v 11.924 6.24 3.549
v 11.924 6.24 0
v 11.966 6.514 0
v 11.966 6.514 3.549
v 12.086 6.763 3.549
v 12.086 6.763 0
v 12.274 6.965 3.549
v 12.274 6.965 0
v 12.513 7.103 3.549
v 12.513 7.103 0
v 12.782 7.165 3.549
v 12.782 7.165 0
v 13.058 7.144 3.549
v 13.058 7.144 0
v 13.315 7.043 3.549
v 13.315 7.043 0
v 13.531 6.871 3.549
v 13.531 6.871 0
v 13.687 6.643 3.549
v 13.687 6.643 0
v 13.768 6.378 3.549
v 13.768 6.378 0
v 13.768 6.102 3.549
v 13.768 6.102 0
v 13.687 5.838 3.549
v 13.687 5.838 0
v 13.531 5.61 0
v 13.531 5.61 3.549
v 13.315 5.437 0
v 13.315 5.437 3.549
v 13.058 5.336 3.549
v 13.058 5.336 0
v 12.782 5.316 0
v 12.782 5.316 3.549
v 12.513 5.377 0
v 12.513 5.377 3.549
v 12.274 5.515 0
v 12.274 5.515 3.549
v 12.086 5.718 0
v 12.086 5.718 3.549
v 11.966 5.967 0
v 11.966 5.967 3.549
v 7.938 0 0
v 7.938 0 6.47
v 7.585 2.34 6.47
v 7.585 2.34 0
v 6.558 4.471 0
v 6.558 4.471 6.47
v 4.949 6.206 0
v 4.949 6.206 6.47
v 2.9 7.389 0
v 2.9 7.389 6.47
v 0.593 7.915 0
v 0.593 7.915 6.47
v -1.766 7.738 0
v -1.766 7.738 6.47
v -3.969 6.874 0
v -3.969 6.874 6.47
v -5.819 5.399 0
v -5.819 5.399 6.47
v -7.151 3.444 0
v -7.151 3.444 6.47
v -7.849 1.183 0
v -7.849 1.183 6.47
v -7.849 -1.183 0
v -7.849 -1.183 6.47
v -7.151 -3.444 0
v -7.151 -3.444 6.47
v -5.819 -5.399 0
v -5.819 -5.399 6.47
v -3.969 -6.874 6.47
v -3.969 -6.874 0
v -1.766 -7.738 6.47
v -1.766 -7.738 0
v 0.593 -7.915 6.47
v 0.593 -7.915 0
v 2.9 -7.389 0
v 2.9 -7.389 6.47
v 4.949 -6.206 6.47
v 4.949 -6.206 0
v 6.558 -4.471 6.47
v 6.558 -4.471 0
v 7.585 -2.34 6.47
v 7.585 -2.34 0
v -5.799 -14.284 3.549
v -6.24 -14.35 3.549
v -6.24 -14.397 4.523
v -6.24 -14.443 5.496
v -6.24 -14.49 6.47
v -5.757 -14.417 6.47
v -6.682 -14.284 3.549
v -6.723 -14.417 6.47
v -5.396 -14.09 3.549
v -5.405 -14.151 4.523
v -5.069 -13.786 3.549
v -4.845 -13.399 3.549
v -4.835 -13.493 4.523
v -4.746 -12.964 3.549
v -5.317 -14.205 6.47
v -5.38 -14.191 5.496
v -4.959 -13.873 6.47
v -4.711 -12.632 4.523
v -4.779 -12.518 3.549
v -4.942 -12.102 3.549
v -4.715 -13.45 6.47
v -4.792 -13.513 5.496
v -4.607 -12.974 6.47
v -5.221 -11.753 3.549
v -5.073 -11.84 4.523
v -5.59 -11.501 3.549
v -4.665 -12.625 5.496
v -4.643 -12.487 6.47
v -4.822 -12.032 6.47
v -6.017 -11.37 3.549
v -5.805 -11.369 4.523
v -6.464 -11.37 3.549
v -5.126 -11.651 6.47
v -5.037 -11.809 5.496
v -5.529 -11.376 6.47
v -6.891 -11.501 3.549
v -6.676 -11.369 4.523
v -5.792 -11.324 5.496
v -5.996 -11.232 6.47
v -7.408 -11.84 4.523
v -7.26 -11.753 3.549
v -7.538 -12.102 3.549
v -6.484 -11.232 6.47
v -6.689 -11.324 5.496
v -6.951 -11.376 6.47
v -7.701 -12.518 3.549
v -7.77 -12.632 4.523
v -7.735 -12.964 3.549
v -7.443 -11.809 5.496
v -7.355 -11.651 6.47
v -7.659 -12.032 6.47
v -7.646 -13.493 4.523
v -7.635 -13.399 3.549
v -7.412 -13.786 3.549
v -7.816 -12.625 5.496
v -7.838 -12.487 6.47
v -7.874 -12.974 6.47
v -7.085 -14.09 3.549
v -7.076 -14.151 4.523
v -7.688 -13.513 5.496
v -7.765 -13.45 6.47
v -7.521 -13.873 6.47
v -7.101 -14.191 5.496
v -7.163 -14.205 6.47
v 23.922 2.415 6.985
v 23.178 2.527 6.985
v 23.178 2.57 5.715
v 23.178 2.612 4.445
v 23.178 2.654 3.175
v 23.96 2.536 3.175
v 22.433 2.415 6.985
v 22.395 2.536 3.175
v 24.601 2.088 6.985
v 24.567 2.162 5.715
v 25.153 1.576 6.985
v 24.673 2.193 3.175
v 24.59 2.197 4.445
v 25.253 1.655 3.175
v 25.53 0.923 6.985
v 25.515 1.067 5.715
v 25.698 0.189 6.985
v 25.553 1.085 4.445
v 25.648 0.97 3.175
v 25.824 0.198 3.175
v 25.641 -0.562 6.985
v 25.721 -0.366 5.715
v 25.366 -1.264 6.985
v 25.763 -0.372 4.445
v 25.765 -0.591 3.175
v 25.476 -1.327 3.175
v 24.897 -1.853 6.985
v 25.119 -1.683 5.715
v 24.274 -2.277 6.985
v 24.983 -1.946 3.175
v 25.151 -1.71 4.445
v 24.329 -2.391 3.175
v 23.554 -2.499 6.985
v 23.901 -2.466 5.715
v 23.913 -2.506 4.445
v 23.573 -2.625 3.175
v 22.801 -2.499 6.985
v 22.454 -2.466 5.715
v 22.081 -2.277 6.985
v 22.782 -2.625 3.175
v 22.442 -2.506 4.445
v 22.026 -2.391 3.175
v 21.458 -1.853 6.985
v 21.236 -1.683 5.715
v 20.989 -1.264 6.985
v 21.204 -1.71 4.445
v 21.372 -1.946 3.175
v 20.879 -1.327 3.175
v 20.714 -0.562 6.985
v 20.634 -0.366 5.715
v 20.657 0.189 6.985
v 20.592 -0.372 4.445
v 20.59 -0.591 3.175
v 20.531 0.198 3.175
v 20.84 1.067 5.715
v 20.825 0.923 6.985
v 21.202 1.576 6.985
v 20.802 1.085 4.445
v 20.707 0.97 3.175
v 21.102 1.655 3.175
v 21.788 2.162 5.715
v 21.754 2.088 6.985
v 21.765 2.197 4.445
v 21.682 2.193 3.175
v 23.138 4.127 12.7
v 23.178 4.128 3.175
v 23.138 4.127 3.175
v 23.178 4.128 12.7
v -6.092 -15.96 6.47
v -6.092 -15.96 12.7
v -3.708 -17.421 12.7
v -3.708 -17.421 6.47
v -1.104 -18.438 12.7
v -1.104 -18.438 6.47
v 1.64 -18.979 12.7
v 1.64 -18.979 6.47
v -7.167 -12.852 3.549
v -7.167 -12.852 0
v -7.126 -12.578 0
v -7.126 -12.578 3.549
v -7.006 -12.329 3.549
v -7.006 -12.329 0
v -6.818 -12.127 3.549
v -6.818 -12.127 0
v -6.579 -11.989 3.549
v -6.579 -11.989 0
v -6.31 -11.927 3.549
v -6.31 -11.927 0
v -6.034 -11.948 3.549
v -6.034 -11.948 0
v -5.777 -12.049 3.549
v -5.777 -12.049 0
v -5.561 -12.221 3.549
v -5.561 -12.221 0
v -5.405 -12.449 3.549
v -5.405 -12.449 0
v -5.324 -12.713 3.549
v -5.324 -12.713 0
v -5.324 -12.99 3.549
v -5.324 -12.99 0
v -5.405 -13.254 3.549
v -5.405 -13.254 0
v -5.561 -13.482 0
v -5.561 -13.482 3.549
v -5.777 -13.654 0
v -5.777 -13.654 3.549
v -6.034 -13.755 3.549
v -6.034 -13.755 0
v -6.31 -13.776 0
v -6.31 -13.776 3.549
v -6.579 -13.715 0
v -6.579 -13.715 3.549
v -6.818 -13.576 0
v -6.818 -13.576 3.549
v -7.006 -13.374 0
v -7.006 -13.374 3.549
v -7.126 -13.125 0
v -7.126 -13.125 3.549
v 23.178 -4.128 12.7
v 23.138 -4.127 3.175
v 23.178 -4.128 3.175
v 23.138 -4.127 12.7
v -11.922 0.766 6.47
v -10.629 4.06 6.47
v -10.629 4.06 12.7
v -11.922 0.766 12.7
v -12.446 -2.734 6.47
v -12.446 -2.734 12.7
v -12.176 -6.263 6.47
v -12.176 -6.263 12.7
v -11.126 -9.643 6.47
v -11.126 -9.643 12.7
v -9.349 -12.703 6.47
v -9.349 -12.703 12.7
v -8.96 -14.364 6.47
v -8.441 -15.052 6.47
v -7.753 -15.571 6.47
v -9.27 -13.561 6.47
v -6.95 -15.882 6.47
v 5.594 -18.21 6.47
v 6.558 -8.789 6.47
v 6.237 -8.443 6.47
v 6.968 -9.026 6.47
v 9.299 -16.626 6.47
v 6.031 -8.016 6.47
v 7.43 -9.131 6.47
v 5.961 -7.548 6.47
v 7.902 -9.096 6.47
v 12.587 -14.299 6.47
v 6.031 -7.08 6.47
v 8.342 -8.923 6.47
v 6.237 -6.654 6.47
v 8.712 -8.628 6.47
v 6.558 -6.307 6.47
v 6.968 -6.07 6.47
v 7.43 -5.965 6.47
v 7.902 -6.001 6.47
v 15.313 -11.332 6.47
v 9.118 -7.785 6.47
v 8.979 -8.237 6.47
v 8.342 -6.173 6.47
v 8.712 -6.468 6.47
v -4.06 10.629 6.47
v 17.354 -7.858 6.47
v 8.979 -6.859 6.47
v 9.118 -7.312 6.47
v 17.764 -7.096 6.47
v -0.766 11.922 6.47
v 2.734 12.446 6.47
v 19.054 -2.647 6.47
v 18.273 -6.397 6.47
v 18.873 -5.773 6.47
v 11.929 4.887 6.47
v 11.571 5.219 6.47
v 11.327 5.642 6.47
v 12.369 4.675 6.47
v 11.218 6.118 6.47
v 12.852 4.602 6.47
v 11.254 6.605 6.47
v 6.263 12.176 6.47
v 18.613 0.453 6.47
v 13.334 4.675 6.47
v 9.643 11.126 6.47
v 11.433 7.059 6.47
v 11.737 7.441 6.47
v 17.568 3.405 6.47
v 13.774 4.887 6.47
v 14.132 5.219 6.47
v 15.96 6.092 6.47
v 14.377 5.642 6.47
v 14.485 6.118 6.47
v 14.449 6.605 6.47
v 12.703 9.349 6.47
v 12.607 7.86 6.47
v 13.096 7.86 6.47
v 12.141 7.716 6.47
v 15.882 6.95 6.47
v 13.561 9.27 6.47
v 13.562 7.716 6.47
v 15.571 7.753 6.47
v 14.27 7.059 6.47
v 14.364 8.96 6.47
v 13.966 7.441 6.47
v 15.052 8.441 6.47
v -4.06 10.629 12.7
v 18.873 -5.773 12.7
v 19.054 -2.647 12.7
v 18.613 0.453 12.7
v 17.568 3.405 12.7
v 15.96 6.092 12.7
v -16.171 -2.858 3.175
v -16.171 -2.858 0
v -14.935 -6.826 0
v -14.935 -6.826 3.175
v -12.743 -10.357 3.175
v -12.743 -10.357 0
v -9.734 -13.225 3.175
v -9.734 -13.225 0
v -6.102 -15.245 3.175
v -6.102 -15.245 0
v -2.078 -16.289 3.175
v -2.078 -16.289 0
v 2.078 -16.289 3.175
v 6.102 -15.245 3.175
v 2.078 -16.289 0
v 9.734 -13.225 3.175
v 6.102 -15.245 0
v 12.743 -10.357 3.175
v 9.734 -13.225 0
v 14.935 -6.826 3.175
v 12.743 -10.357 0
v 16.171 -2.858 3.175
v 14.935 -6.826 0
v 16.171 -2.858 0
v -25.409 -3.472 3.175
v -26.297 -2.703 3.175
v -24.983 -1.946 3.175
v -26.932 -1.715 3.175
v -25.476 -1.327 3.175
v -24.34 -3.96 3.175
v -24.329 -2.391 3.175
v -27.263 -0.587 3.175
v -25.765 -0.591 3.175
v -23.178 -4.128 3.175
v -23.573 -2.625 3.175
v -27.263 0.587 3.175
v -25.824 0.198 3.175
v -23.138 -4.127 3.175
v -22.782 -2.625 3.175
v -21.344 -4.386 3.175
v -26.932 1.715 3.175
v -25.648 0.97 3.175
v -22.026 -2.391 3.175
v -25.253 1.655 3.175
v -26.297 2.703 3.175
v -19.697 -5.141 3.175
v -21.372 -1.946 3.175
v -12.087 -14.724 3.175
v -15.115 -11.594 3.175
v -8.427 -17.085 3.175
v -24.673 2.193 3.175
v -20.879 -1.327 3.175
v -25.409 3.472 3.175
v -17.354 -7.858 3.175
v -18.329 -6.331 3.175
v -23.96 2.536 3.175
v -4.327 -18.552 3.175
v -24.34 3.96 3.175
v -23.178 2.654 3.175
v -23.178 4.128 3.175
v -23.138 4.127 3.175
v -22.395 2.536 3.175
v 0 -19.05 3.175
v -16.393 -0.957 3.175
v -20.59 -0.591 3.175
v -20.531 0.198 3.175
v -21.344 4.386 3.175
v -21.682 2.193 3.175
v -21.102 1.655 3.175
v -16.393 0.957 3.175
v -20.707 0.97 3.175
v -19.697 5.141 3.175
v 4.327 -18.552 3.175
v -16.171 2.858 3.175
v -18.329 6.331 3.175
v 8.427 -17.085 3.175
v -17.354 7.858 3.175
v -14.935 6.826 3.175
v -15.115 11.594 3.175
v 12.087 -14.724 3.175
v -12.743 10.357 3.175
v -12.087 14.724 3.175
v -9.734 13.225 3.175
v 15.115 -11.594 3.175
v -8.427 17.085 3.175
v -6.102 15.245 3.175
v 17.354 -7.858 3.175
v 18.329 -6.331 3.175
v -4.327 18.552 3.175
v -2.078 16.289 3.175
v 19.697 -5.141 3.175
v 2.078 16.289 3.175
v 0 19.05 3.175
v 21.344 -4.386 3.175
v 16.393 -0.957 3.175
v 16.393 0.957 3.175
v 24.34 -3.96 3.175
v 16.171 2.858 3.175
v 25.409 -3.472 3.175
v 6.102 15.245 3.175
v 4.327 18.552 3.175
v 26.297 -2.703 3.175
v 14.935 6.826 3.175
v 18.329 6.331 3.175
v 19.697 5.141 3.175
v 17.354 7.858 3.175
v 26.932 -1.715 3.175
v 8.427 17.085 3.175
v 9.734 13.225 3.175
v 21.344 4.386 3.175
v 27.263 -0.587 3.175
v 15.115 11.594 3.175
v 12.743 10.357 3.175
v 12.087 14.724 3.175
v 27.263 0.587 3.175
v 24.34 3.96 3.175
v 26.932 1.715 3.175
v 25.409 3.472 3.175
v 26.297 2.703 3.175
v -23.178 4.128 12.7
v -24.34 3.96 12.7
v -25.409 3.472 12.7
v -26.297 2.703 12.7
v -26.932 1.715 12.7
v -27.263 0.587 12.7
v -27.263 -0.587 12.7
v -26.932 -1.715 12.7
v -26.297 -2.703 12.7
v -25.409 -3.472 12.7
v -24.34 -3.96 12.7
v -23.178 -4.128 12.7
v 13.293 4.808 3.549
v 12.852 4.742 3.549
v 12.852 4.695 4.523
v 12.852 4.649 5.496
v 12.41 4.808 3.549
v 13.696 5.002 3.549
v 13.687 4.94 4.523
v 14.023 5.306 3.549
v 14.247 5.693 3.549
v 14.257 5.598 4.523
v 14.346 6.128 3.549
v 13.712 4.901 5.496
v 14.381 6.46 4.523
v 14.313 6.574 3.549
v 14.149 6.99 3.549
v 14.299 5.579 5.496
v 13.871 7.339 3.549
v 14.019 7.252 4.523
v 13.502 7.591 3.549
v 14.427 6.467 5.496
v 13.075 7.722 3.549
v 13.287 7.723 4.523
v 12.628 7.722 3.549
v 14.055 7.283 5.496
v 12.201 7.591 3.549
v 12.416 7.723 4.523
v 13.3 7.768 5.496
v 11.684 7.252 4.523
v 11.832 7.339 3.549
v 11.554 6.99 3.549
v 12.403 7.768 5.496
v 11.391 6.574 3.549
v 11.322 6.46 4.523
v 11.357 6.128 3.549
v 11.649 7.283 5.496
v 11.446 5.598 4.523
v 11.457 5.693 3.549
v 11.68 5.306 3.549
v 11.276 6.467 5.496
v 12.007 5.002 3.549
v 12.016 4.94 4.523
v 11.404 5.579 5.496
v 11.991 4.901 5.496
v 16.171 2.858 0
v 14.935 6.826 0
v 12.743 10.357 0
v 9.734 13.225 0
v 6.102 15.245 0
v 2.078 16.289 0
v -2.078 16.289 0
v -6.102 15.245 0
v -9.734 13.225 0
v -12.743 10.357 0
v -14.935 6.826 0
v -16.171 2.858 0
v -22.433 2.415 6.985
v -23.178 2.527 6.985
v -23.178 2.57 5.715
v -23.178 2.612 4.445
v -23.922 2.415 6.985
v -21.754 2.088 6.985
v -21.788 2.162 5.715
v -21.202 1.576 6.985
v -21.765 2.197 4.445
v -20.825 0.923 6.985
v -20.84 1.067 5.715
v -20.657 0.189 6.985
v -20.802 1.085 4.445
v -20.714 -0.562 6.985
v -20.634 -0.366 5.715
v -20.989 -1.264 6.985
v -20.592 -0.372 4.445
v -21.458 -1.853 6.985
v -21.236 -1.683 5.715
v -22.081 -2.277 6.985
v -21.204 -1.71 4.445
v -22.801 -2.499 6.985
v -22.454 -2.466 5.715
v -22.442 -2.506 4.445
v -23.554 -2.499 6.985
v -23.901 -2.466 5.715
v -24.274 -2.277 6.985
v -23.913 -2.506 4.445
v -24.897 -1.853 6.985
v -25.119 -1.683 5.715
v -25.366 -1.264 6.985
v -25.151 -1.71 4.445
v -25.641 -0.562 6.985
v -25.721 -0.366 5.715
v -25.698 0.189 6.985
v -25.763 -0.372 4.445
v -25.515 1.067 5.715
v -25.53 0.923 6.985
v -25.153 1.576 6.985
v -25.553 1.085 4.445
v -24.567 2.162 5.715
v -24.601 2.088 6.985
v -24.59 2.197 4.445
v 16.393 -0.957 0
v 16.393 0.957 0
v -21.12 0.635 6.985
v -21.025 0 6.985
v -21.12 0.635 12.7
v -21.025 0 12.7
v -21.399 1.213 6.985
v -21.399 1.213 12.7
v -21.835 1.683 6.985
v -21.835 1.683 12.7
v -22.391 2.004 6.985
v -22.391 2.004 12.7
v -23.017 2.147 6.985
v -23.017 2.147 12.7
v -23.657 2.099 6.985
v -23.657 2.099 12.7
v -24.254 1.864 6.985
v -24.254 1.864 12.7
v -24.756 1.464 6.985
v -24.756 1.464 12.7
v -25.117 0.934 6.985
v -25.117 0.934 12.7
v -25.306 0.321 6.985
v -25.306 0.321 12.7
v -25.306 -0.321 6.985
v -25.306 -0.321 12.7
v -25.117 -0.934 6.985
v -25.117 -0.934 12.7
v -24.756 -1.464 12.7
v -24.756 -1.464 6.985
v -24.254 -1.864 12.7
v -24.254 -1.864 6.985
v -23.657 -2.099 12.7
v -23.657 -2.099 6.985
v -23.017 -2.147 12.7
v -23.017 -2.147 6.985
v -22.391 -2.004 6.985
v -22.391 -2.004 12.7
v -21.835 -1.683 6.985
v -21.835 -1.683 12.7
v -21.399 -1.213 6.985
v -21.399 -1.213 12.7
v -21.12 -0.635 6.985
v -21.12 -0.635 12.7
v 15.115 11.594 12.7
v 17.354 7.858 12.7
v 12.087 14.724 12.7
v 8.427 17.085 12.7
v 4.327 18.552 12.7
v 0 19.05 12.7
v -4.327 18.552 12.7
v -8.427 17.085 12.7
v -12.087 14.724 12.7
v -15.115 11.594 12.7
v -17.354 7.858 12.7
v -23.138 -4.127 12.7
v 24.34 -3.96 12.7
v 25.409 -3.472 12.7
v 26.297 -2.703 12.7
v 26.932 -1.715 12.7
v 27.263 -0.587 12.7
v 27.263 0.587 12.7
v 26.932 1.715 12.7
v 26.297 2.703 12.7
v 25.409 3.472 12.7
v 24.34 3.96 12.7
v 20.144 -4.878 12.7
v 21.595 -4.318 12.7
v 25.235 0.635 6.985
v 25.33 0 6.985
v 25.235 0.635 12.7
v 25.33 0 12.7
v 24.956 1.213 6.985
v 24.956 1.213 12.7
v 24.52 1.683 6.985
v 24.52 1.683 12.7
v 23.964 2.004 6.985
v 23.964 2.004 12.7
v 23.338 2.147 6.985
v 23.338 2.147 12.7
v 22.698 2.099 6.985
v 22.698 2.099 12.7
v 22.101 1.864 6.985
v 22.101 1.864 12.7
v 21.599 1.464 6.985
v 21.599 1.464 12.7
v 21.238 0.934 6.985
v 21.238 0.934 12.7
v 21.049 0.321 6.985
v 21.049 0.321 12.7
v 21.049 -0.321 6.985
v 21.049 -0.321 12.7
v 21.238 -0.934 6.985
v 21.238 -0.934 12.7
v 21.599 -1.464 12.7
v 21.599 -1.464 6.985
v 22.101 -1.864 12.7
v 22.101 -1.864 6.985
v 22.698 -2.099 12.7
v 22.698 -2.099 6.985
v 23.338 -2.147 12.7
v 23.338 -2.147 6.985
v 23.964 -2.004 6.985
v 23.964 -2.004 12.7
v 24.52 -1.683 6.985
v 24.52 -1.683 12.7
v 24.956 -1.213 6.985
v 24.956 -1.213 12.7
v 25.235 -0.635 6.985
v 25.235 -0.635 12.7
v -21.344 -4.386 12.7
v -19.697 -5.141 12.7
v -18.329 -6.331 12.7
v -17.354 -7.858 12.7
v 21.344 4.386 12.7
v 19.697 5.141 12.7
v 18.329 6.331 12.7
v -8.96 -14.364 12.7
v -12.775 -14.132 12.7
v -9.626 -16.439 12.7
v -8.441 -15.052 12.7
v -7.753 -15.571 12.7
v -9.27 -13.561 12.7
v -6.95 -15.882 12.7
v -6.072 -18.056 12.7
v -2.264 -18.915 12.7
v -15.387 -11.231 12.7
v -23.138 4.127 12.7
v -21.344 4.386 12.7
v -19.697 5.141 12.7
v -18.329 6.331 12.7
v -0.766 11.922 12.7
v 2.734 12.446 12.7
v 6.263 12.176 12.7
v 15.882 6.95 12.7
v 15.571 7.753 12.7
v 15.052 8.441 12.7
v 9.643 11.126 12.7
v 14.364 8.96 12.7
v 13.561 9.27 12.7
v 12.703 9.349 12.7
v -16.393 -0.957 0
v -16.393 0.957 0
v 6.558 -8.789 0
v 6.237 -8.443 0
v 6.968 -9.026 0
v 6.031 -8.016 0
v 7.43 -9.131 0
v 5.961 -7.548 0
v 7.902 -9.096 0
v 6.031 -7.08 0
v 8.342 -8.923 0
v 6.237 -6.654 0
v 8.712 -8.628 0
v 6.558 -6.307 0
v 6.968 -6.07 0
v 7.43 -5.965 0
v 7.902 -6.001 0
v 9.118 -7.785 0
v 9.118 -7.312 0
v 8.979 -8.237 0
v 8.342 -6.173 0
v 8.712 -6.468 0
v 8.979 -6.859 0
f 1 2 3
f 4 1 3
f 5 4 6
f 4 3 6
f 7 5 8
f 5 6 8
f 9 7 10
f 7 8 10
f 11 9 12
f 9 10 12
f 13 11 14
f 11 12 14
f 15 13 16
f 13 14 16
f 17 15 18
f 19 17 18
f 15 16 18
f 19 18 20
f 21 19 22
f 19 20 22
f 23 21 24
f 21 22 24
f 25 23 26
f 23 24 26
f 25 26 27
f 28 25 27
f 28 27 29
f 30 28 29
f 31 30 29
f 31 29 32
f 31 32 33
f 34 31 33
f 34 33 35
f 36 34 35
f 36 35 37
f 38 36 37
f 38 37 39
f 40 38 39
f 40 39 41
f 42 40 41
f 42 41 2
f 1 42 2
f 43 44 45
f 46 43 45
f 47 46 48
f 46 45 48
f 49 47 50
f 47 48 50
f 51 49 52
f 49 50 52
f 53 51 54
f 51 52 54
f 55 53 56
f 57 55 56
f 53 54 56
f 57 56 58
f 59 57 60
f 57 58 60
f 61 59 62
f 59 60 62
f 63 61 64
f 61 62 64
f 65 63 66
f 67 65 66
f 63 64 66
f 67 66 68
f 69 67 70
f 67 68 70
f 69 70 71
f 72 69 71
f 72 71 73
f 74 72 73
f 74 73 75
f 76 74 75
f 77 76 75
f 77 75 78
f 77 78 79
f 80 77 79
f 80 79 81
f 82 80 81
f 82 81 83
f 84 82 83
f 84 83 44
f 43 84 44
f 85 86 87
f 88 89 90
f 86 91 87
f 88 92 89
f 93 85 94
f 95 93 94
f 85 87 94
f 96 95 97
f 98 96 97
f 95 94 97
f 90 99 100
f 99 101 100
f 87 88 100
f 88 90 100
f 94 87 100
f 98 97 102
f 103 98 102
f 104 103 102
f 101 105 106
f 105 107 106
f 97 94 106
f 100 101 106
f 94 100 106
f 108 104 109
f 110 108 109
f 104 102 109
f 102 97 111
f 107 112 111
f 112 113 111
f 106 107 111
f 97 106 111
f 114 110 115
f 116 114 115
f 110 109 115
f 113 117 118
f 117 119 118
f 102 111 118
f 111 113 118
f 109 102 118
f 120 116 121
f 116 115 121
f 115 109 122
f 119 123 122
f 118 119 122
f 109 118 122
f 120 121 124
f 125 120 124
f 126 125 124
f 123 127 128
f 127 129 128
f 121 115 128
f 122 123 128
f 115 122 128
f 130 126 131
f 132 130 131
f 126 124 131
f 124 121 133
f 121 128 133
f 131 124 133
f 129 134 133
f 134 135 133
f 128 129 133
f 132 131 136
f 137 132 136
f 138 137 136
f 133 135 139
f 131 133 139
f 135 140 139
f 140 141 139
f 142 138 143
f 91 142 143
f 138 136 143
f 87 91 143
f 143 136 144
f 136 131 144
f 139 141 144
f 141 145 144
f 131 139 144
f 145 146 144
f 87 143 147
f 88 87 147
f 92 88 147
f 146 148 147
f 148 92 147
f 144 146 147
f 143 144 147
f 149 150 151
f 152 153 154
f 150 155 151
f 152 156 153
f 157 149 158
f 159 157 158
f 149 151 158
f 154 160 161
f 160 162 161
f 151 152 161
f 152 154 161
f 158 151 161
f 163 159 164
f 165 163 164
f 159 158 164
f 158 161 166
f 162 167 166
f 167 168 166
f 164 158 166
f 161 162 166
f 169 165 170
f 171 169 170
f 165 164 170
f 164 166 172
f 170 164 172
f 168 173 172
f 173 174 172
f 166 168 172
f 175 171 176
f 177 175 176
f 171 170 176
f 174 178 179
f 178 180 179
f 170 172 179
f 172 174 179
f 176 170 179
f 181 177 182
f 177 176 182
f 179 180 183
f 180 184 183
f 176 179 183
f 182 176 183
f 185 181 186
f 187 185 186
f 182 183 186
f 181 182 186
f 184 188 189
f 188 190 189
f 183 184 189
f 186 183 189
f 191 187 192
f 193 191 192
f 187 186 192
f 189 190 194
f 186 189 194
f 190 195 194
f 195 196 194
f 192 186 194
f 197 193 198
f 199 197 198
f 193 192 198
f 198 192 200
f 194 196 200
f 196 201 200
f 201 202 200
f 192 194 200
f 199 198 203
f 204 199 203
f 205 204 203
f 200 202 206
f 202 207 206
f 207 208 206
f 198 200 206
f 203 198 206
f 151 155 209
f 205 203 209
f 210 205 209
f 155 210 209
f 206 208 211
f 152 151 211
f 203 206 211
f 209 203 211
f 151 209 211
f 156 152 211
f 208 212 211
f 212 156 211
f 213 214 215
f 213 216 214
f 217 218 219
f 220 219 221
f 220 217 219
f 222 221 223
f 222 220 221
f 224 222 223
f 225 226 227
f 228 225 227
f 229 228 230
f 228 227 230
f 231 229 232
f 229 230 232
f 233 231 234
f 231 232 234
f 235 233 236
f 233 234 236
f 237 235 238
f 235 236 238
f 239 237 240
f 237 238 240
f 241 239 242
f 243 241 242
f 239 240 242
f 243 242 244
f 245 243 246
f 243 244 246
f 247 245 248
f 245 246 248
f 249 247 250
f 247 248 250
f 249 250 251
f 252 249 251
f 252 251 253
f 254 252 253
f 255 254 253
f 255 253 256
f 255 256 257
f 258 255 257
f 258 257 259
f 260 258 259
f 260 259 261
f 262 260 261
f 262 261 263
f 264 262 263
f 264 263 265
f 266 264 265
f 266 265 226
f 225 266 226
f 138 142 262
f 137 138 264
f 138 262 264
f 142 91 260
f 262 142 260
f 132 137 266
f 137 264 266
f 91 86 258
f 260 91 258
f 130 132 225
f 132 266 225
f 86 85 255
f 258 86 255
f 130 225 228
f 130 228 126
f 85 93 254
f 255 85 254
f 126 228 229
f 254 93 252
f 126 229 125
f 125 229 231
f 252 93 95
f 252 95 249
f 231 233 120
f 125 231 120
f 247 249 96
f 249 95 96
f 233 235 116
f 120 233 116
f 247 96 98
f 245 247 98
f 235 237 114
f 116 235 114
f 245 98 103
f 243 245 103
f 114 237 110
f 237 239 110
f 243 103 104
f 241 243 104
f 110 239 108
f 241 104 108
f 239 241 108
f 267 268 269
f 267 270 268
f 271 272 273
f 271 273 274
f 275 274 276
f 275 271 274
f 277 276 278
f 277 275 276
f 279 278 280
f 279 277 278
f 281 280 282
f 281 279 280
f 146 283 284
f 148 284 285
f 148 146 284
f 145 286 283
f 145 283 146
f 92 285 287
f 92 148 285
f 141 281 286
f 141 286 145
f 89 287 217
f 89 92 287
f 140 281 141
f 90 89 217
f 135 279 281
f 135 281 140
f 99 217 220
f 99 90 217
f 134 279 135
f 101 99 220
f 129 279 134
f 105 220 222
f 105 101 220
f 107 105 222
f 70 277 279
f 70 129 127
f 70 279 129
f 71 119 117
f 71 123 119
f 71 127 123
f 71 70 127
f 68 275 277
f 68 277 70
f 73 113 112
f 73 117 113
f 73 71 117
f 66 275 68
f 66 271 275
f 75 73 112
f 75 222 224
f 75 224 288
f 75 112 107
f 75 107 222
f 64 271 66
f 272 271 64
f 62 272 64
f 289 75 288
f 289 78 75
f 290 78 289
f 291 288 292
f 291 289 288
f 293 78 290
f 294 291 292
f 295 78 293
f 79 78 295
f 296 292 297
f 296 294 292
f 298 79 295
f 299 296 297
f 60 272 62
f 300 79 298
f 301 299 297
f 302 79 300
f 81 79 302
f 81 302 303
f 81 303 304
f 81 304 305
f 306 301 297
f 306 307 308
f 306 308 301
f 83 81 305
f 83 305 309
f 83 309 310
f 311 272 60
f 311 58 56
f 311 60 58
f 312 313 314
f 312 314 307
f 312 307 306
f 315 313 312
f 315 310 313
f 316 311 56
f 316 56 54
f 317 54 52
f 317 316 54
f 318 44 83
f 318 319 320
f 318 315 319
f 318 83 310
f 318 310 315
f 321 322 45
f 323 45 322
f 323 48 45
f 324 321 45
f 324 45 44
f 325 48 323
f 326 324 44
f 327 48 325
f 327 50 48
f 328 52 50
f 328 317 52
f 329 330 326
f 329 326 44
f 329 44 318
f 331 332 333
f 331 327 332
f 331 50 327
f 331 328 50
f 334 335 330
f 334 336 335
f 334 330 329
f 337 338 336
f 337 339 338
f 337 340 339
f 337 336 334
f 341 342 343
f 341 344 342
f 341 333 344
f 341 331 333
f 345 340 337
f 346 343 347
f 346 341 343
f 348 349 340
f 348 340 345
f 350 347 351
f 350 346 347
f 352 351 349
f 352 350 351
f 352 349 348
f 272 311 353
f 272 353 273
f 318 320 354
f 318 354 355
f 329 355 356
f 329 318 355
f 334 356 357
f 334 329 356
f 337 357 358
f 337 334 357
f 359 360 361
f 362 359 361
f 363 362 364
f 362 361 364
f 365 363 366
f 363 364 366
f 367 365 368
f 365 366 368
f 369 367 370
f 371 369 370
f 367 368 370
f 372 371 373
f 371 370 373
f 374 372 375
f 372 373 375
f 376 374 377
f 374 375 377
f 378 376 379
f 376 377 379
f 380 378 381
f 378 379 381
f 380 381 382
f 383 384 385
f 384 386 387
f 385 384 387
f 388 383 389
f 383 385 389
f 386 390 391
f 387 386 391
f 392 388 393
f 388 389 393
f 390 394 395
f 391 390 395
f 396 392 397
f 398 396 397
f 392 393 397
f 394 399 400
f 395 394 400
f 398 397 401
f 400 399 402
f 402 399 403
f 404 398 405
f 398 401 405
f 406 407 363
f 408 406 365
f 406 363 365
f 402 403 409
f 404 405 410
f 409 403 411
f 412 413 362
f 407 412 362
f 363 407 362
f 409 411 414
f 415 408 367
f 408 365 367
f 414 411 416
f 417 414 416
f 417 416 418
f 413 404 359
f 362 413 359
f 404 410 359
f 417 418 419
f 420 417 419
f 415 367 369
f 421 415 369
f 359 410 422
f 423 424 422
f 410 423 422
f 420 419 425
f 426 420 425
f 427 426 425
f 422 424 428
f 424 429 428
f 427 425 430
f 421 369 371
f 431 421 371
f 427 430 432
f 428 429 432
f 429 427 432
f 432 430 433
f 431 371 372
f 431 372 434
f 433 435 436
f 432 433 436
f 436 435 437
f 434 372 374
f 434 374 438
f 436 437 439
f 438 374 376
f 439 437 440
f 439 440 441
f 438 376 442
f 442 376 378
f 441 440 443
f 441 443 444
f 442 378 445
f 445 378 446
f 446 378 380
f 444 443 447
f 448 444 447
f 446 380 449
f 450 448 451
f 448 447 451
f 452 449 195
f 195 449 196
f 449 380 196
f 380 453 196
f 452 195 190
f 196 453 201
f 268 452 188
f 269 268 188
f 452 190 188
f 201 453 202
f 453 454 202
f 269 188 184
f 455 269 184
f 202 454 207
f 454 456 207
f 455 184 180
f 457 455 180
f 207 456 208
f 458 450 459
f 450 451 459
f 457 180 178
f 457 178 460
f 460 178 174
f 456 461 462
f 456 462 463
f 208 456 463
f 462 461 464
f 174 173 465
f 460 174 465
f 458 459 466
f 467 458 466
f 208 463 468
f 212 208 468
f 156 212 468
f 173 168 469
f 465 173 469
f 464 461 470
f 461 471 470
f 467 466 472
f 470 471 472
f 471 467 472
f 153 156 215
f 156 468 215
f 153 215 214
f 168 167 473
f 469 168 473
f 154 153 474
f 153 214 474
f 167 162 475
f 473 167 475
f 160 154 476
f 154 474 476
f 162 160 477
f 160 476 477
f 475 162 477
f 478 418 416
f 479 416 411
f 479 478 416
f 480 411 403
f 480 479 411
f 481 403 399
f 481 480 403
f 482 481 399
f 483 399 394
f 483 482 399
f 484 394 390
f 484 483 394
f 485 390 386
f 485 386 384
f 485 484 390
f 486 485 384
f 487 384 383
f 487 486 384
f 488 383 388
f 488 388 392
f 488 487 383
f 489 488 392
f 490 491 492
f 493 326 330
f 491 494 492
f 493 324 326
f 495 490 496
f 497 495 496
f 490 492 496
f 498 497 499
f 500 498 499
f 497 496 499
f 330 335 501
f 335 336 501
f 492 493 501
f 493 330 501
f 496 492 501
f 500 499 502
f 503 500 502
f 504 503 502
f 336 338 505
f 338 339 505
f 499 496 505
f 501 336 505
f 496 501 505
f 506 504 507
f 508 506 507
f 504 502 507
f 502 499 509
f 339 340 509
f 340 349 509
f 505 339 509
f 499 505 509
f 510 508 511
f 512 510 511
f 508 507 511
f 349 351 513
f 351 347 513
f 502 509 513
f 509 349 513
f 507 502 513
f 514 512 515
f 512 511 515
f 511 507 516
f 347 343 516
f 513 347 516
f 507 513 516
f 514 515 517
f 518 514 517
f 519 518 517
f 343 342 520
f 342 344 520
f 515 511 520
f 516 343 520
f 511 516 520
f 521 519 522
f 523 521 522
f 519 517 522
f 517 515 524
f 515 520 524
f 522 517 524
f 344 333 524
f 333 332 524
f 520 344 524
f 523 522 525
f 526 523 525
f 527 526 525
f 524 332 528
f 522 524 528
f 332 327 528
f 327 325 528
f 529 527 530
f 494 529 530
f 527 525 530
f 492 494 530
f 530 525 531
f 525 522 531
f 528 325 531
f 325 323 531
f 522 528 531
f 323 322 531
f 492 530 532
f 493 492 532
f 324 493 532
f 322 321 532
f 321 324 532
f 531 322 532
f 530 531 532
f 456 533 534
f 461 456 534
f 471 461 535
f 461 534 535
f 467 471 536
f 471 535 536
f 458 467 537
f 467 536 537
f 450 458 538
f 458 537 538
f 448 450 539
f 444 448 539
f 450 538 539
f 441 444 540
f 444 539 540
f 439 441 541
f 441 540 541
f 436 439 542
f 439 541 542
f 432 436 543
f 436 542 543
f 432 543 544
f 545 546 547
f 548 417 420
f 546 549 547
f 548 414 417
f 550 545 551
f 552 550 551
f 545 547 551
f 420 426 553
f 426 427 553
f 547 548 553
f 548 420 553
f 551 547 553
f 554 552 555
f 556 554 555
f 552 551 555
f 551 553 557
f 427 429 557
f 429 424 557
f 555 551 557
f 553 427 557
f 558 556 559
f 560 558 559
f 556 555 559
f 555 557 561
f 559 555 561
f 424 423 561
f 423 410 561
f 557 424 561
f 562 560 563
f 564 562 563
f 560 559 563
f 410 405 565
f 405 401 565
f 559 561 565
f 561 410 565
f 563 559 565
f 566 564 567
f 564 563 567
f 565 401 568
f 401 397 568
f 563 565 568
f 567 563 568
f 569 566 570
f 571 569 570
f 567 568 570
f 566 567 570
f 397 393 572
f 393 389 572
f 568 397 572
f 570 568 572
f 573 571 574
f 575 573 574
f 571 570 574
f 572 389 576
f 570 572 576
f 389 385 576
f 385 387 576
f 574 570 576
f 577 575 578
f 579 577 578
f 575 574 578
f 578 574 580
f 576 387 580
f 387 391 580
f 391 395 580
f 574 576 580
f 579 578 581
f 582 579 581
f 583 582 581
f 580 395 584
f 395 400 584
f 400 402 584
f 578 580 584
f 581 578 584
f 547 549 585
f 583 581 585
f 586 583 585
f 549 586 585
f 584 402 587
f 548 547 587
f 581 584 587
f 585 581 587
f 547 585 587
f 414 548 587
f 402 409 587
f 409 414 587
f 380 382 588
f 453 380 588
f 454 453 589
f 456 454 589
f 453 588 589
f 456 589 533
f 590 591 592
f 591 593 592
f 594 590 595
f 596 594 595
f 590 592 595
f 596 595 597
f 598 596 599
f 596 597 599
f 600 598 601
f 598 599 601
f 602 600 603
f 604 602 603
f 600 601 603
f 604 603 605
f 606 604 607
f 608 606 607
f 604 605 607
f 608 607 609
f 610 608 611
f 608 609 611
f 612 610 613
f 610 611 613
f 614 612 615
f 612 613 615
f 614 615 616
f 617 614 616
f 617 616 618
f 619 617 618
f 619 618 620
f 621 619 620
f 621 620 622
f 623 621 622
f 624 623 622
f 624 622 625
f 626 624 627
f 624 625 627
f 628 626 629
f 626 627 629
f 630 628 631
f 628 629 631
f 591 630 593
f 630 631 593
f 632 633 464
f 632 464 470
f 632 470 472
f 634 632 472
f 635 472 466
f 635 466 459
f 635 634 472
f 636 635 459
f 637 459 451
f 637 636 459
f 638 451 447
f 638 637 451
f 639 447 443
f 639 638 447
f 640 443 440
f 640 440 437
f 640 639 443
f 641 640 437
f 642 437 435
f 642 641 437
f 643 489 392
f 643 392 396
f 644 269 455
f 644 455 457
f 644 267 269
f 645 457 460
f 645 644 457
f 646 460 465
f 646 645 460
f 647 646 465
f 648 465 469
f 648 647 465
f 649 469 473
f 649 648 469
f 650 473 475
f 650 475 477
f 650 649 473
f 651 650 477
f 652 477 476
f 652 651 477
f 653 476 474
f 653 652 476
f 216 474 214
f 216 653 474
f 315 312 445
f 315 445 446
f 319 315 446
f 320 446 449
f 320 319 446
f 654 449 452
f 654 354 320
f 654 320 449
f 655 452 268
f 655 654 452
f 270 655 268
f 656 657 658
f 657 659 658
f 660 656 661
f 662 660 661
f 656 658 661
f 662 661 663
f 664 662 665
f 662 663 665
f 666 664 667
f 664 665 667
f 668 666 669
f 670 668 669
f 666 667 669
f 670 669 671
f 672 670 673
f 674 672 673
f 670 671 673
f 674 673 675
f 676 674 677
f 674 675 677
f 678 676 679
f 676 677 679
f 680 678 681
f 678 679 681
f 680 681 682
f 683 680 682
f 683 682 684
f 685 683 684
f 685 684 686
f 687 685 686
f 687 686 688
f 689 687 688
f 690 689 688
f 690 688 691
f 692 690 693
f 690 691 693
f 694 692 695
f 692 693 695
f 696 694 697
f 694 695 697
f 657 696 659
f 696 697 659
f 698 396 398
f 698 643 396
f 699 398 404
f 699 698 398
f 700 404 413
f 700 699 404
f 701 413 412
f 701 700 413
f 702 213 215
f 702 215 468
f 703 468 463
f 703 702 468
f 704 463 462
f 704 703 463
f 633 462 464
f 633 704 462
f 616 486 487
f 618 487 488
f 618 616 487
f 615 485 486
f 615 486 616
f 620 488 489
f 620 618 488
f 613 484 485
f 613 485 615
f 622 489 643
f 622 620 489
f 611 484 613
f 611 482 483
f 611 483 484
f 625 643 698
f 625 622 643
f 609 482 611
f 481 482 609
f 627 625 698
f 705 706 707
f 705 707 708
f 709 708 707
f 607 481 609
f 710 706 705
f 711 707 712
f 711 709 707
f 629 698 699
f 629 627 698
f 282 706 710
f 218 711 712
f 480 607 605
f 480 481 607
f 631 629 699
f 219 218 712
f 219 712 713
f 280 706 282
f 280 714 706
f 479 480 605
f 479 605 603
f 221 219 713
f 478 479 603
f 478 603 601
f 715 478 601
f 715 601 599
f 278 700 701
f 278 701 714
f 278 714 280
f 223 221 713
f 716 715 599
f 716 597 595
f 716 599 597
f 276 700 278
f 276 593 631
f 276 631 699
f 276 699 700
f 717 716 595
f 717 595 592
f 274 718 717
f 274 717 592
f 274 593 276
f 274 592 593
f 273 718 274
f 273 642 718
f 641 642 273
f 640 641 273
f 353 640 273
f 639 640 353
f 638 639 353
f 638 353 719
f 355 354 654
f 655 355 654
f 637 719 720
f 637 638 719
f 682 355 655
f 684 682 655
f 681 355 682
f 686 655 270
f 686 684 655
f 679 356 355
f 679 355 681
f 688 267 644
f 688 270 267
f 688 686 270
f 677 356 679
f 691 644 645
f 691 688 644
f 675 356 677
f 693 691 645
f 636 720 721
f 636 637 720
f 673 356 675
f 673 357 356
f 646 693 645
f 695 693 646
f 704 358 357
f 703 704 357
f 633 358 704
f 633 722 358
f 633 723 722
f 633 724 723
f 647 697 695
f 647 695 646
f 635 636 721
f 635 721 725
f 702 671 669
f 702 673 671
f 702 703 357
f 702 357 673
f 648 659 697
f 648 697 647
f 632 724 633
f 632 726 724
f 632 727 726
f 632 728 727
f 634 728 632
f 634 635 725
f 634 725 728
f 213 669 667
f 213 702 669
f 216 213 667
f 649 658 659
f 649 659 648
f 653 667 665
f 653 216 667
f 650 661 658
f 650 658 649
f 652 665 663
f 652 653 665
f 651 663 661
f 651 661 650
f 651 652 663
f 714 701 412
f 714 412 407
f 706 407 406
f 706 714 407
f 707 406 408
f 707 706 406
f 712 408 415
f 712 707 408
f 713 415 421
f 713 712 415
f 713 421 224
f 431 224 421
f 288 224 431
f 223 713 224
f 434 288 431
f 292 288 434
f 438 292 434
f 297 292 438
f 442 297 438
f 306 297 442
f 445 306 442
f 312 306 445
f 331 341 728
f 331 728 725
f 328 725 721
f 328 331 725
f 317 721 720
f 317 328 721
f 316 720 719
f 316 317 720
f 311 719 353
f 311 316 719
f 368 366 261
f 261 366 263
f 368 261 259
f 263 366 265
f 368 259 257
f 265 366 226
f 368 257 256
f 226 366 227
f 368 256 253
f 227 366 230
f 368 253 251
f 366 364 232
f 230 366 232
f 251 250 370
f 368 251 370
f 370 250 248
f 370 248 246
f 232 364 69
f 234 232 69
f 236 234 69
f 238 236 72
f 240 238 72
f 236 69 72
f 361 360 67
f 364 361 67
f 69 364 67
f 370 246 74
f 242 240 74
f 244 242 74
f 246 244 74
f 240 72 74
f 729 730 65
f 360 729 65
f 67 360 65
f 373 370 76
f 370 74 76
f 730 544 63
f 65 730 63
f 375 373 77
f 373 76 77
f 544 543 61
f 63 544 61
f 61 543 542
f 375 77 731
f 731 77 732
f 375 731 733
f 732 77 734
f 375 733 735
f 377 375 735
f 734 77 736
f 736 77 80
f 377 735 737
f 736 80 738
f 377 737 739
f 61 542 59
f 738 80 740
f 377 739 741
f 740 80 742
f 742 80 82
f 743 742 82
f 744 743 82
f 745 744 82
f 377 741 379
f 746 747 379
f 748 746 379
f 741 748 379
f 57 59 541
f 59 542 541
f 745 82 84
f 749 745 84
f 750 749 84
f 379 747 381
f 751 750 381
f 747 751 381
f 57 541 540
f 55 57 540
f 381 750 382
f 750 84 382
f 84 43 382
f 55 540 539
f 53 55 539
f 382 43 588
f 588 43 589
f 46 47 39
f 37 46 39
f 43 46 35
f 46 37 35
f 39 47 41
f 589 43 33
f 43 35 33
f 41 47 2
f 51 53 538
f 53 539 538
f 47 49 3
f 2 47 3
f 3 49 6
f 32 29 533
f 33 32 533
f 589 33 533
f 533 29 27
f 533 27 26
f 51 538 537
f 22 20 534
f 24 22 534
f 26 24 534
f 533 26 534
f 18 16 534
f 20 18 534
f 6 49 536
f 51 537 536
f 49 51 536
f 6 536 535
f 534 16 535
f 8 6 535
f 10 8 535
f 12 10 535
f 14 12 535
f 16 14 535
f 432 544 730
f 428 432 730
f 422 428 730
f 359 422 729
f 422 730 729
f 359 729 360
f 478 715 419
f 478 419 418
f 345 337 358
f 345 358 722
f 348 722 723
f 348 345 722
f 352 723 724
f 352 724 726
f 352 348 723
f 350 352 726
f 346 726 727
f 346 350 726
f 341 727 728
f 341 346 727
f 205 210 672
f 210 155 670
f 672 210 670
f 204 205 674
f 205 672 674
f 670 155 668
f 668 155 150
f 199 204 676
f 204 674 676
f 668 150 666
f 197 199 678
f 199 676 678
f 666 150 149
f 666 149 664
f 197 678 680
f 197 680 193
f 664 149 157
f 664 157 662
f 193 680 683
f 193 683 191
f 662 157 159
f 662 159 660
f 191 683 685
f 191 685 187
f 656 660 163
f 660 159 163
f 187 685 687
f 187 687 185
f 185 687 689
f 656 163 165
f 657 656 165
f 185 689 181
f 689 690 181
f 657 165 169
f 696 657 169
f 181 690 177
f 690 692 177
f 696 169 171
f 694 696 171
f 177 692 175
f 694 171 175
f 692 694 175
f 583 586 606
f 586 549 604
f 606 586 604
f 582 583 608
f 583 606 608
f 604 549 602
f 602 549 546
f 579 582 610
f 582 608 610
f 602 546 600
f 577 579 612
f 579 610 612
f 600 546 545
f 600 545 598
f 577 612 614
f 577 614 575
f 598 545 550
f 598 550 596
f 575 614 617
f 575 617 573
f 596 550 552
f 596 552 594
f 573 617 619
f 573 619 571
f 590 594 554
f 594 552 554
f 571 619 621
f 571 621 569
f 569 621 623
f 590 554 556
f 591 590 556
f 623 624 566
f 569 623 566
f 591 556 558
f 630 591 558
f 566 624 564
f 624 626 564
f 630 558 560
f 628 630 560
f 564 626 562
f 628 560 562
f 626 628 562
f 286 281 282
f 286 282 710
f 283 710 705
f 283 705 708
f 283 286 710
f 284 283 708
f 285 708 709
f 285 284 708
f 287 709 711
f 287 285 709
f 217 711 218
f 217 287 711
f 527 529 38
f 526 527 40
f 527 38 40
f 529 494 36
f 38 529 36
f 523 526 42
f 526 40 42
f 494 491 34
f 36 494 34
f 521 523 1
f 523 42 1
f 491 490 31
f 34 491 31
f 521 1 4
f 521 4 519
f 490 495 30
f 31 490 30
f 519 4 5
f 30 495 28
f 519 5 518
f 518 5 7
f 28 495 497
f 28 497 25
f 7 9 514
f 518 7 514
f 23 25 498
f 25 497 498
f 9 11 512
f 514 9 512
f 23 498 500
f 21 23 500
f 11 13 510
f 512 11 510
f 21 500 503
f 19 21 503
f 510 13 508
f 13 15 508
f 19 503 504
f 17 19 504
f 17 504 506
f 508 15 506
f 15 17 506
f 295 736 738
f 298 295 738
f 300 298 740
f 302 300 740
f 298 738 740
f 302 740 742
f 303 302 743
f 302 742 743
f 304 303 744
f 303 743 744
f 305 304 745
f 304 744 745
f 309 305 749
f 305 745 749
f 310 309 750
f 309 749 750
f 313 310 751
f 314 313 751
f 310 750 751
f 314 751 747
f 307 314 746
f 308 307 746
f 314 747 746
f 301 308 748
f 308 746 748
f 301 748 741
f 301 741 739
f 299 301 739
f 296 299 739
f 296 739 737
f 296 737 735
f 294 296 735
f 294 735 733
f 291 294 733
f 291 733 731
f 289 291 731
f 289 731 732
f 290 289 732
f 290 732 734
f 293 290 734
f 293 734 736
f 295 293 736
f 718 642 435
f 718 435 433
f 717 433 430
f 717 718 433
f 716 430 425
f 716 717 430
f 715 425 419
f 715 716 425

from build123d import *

# Parameters (mm, degrees)
SKETCH1_R                     = 7.9375
BOSS_EXTRUDE1_DEPTH           = 6.35
SKETCH2_R                     = 16.4211
BOSS_EXTRUDE3_DEPTH           = 6.35
BOSS_EXTRUDE3_DEPTH_BACK      = 3.175
F_6_CLEARANCE_HOLE1_D         = 4.3053
F_6_CLEARANCE_HOLE1_DEPTH     = 9.525
F_6_PLASTIC_INSERT_AT_2_COUNT = 2
F_6_PLASTIC_INSERT_AT_2_PITCH = 46.355
BOSS_EXTRUDE4_REACH           = 14.7
SKETCH22_R                    = 16.4211
SKETCH22_R_2                  = 7.9375
CUT_EXTRUDE1_START            = -6.23
CUT_EXTRUDE1_DEPTH            = 6.23
SKETCH24_R                    = 1.5875
CUT_EXTRUDE2_DEPTH            = 13.7
HOLE1_AT_2_COUNT              = 2
HOLE1_AT_2_PITCH              = 27
F_0_CLEARANCE_HOLE1_D         = 1.8542


with BuildPart() as part:
    # Sketch1 → Boss-Extrude1 (new body)
    with BuildSketch(Plane.XY):
        with BuildLine():
            ThreePointArc((16.170566439, -2.8575), (16.4211, 0), (16.170566439, 2.8575))
            ThreePointArc((16.170566439, 2.8575), (0, 16.4211), (-16.170566439, 2.8575))
            ThreePointArc((-16.170566439, 2.8575), (-16.4211, 0), (-16.170566439, -2.8575))
            ThreePointArc((-16.170566439, -2.8575), (0, -16.4211), (16.170566439, -2.8575))
        make_face()
        Circle(SKETCH1_R, mode=Mode.SUBTRACT)
    extrude(amount=BOSS_EXTRUDE1_DEPTH)

    # Sketch2 → Boss-Extrude3 (add, two sides)
    with BuildSketch(Plane.XY.offset(6.35)) as boss_extrude3_sk:
        with BuildLine():
            Line((23.1775, 4.1275), (23.138323054, 4.1275))
            ThreePointArc((23.138323054, 4.1275), (19.696705066, 5.14104372), (17.35374229, 7.858125))
            ThreePointArc((17.35374229, 7.858125), (0, 19.05), (-17.35374229, 7.858125))
            ThreePointArc((-17.35374229, 7.858125), (-19.696705066, 5.14104372), (-23.138323054, 4.1275))
            Line((-23.138323054, 4.1275), (-23.1775, 4.1275))
            ThreePointArc((-23.1775, 4.1275), (-27.305, 0), (-23.1775, -4.1275))
            Line((-23.1775, -4.1275), (-23.138323054, -4.1275))
            ThreePointArc((-23.138323054, -4.1275), (-19.696705066, -5.14104372), (-17.35374229, -7.858125))
            ThreePointArc((-17.35374229, -7.858125), (0, -19.05), (17.35374229, -7.858125))
            ThreePointArc((17.35374229, -7.858125), (19.696705066, -5.14104372), (23.138323054, -4.1275))
            Line((23.138323054, -4.1275), (23.1775, -4.1275))
            ThreePointArc((23.1775, -4.1275), (27.305, 0), (23.1775, 4.1275))
        make_face()
        Circle(SKETCH2_R, mode=Mode.SUBTRACT)
    extrude(amount=BOSS_EXTRUDE3_DEPTH)
    extrude(boss_extrude3_sk.sketch, amount=-BOSS_EXTRUDE3_DEPTH_BACK)

    # #6 Clearance Hole1
    with Locations(Plane(origin=(-22.699598292, 0.104385938, 3.175), x_dir=(-1, 0, 0), z_dir=(0, 0, -1))):
        with Locations((-45.877098292, -0.104385938), (0.477901708, -0.104385938)):
            Hole(F_6_CLEARANCE_HOLE1_D / 2, depth=F_6_CLEARANCE_HOLE1_DEPTH)

    # Sketch5 → #6 Plastic Insert (revolve, cut)
    with BuildSketch(Plane(origin=(23.1775, 0, 3.175), x_dir=(0, 1, 0), z_dir=(1, 0, 0))):
        Polygon((0, 0), (0, 3.81), (2.5273, 3.81), (2.6543, 0), align=None)
    f_6_plastic_insert = revolve(axis=Axis((23.1775, 0, 113.175), (0, 0, -1)), mode=Mode.SUBTRACT)

    # #6 Plastic Insert at 2: #6 Plastic Insert ×2
    with Locations(*[(-i * F_6_PLASTIC_INSERT_AT_2_PITCH, 0, 0) for i in range(1, F_6_PLASTIC_INSERT_AT_2_COUNT)]):
        add(f_6_plastic_insert, mode=Mode.SUBTRACT)

    # Sketch22 → Boss-Extrude4 (add, up to next)
    with BuildSketch(Plane.XY.offset(12.7), mode=Mode.PRIVATE) as boss_extrude4_sk1:
        Circle(SKETCH22_R)
        Circle(SKETCH22_R_2, mode=Mode.SUBTRACT)
    boss_extrude4_tool1 = extrude(boss_extrude4_sk1.sketch, amount=-BOSS_EXTRUDE4_REACH, mode=Mode.PRIVATE) - part.part
    add(boss_extrude4_tool1.solids().sort_by_distance((-15.956641, 0, 12.7))[0])

    # Sketch23 → Cut-Extrude1 (cut)
    with BuildSketch(Plane.XY.offset(12.7).offset(CUT_EXTRUDE1_START)):
        with BuildLine():
            Line((-4.060251152, 10.629391126), (-10.629391126, 4.060251152))
            ThreePointArc((-10.629391126, 4.060251152), (-12.41058312, -4.506273431), (-9.348763248, -12.702812177))
            ThreePointArc((-9.348763248, -12.702812177), (-8.44083665, -15.052079048), (-6.091569778, -15.960005646))
            ThreePointArc((-6.091569778, -15.960005646), (14.451038284, -14.451038284), (15.960005646, 6.091569778))
            ThreePointArc((15.960005646, 6.091569778), (15.052079048, 8.44083665), (12.702812177, 9.348763248))
            ThreePointArc((12.702812177, 9.348763248), (4.506273431, 12.41058312), (-4.060251152, 10.629391126))
        make_face()
    extrude(amount=CUT_EXTRUDE1_DEPTH, mode=Mode.SUBTRACT)

    # Sketch24 → Cut-Extrude2 (cut, through all)
    with BuildSketch(Plane(origin=(0, 0, 0), x_dir=(-1, 0, 0), z_dir=(0, 0, -1))):
        with Locations((-7.548261886, -7.548261886)):
            Circle(SKETCH24_R)
    extrude(amount=-CUT_EXTRUDE2_DEPTH, mode=Mode.SUBTRACT)

    # Sketch26 → Hole1 (revolve, cut)
    with BuildSketch(Plane(origin=(-6.240320347, -12.851562745, 6.47), x_dir=(0, -1, 0), z_dir=(1, 0, 0))):
        Polygon((0, 0), (0, 2.921), (1.4986, 2.921), (1.6383, 0), align=None)
    hole1 = revolve(axis=Axis((-6.240320347, -12.851562745, -103.53), (0, 0, 1)), mode=Mode.SUBTRACT)

    # Hole1 at 2: Hole1 ×2
    with Locations(*[Vector(0.707106781, 0.707106781, 0) * (i * HOLE1_AT_2_PITCH) for i in range(1, HOLE1_AT_2_COUNT)]):
        add(hole1, mode=Mode.SUBTRACT)

    # #0 Clearance Hole1 (through all)
    with Locations(Plane.XY.offset(6.47)):
        with Locations((-6.240320347, -12.851562745), (12.851562745, 6.240320347)):
            Hole(F_0_CLEARANCE_HOLE1_D / 2)


solid = part.part
